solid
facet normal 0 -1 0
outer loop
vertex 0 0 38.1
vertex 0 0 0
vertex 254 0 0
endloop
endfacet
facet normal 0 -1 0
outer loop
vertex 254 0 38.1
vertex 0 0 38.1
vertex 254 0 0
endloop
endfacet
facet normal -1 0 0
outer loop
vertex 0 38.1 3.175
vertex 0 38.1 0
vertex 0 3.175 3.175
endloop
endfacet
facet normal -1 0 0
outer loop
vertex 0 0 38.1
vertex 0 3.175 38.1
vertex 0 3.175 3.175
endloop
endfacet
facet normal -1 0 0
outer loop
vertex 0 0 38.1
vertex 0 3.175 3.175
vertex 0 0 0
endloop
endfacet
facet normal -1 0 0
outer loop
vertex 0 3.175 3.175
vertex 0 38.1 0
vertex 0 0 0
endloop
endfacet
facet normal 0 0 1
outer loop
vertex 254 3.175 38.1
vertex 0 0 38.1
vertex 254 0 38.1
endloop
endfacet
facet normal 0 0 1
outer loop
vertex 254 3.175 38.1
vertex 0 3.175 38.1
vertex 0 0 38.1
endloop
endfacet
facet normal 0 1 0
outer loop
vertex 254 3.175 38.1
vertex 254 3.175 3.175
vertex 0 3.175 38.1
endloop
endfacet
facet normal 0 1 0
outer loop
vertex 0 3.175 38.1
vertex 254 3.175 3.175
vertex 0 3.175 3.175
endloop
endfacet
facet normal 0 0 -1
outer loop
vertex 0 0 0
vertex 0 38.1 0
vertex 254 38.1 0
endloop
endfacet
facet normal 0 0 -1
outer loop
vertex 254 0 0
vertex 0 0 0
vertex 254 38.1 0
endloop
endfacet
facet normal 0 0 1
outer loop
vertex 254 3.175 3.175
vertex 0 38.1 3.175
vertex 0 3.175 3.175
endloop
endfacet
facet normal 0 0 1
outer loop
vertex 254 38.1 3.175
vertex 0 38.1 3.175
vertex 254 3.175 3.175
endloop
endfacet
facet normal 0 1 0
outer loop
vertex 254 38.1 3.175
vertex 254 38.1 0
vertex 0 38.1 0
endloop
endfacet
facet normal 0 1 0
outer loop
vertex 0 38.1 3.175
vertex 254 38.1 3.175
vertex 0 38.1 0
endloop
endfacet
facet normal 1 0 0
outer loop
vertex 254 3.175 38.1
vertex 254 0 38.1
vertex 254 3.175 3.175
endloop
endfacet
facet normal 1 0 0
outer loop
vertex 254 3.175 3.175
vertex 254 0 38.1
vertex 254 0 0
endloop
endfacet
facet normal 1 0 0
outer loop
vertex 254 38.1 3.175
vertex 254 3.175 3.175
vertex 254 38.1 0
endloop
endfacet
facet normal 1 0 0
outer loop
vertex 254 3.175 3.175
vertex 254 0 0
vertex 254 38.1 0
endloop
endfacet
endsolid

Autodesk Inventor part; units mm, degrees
ref_plane "YZ Plane" through (0, 0, 0) normal (1, 0, 0) x (0, 1, 0)
ref_plane "XZ Plane" through (0, 0, 0) normal (0, 1, 0) x (-1, 0, 0)
ref_plane "XY Plane" through (0, 0, 0) normal (0, 0, 1) x (1, 0, 0)
sketch "Sketch1" plane through (0, 0, 0) normal (0, 0, 1) x (1, 0, 0)
  line L0 (0, 0) -> (254, 0)
  line L1 (254, 0) -> (254, 38.1)
  line L2 (254, 38.1) -> (0, 38.1)
  line L3 (0, 38.1) -> (0, 0)
  dimension "d0" = 254
  dimension "d1" = 38.1
extrude "Extrusion1" add sketch "Sketch1" along normal blind 3.175
sketch "Sketch2" plane through (0, 0, 3.175) normal (0, 0, 1) x (1, 0, 0)
  line L0 (0, 0) -> (254, 0) projected
  line L1 (0, 0) -> (254, 0)
  line L2 (254, 0) -> (254, 3.175)
  line L3 (254, 3.175) -> (0, 3.175)
  line L4 (0, 3.175) -> (0, 0)
  dimension "d4" = 3.175
  dimension "d5" = 254
extrude "Extrusion2" add sketch "Sketch2" along normal blind 34.925
properties part number "CLB_061_OutsideLBracket"
